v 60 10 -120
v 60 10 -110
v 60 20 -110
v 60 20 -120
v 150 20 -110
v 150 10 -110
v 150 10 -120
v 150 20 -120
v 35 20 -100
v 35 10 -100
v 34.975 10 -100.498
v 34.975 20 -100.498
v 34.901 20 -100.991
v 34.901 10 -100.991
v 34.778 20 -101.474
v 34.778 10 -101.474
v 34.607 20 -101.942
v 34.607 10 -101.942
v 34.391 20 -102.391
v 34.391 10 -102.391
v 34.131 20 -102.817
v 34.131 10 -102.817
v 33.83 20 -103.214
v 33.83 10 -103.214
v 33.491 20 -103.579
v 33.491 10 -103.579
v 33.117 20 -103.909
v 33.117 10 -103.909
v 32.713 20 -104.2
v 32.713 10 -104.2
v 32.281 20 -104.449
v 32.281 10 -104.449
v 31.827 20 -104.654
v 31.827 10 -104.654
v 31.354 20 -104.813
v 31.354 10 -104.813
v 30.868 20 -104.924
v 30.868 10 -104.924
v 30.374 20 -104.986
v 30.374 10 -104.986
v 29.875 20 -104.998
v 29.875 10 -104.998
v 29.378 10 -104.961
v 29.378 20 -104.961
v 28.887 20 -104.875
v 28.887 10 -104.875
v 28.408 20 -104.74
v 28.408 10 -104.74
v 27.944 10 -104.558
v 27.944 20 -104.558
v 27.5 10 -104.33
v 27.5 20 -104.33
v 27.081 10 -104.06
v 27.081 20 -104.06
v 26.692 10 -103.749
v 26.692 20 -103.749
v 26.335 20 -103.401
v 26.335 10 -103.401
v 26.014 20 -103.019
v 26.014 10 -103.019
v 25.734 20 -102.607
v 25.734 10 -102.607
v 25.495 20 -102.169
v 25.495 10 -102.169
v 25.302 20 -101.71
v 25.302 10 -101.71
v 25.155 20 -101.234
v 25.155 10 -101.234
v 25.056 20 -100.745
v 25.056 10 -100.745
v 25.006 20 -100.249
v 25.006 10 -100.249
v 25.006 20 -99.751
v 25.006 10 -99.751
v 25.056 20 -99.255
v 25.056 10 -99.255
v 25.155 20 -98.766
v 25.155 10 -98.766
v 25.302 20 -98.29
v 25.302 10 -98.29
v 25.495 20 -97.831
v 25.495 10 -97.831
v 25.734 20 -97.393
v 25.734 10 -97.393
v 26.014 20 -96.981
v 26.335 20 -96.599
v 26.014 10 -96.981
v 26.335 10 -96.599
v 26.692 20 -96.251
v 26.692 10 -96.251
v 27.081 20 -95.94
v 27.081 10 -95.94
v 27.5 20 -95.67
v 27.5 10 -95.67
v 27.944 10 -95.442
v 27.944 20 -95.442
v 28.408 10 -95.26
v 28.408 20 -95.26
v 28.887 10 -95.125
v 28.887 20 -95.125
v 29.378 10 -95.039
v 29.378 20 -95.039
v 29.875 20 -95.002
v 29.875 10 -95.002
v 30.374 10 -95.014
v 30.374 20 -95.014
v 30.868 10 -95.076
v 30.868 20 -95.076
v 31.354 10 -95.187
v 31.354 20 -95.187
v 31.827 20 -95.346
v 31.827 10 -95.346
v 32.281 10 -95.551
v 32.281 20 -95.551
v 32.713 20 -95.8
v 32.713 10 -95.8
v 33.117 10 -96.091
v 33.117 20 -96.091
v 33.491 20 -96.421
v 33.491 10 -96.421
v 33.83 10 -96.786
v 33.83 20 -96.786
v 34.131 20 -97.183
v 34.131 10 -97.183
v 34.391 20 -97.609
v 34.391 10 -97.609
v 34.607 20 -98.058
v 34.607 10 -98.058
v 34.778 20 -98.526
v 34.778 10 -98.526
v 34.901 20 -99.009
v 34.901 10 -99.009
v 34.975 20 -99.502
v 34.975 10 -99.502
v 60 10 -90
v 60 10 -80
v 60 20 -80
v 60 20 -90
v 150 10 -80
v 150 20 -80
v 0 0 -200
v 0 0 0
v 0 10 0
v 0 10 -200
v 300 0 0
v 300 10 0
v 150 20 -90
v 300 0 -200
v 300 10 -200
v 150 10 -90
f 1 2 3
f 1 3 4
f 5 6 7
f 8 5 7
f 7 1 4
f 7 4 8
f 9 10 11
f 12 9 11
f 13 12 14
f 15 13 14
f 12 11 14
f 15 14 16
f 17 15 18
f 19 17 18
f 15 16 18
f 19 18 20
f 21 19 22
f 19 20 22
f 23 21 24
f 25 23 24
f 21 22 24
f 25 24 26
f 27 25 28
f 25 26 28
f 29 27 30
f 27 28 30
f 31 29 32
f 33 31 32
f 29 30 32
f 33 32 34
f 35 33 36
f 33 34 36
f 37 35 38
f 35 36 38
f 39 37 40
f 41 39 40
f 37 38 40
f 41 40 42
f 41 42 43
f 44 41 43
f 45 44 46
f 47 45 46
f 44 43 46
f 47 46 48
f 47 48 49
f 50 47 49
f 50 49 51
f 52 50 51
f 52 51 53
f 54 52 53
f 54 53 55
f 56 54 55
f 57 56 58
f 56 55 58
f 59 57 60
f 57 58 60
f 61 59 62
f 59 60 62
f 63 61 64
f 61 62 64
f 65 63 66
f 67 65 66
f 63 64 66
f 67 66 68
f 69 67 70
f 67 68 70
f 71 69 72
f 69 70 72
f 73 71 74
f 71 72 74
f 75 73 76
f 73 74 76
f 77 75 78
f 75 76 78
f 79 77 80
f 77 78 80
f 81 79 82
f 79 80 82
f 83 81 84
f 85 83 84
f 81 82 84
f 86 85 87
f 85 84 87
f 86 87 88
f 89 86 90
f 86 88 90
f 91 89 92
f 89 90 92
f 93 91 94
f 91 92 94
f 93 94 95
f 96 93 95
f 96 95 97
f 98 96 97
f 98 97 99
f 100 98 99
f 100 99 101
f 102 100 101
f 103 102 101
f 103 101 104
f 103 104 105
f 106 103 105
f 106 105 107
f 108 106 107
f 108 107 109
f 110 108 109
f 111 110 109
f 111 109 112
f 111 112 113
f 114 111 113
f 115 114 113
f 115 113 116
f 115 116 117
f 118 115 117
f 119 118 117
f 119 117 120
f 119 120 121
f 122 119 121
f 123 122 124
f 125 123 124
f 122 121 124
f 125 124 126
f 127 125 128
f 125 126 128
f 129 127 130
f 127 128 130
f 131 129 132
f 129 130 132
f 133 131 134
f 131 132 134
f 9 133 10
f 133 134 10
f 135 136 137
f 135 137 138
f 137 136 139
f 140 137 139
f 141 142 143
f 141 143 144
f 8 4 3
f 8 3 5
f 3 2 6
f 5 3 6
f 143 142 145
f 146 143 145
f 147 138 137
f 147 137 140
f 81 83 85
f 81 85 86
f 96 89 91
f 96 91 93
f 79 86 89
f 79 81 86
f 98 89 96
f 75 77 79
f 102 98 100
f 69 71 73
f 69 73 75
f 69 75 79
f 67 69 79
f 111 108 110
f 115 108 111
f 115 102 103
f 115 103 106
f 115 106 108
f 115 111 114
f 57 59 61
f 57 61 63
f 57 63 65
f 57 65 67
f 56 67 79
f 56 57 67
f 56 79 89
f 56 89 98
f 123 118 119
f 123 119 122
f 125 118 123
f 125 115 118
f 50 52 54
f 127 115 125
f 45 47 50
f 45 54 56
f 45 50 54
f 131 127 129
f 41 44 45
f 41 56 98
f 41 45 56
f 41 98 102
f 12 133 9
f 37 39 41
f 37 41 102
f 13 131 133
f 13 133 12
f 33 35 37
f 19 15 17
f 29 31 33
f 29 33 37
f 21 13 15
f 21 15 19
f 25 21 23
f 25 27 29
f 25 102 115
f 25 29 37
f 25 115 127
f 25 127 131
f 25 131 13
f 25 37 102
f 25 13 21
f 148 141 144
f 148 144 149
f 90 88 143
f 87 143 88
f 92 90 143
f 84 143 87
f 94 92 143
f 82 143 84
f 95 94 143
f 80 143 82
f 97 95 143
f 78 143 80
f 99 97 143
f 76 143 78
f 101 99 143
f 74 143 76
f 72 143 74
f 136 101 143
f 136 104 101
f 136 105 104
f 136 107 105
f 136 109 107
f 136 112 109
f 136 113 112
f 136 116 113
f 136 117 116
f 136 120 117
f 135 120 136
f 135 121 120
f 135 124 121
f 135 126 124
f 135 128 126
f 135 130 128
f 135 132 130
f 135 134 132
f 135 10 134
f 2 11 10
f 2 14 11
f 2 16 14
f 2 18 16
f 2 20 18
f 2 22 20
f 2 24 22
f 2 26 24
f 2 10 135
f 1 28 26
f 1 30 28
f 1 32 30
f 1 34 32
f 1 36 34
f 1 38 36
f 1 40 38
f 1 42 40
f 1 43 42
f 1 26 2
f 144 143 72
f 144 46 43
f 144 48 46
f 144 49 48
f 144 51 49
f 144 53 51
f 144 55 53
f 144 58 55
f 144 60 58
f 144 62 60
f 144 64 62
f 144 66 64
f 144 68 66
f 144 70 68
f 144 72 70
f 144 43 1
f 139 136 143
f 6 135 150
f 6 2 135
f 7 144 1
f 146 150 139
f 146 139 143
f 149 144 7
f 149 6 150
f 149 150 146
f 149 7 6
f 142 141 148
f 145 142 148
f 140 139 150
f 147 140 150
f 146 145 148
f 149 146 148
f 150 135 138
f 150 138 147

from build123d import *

# Parameters (mm, degrees)
SKETCH1_W           = 300
SKETCH1_H           = 200
BOSS_EXTRUDE1_DEPTH = 10
SKETCH2_R           = 5
SKETCH2_W           = 90
SKETCH2_H           = 10
BOSS_EXTRUDE2_DEPTH = 10


with BuildPart() as part:
    # Sketch1 → Boss-Extrude1 (new body)
    with BuildSketch(Plane(origin=(0, 0, 0), x_dir=(1, 0, 0), z_dir=(0, 1, 0))):
        with Locations((150, 100)):
            Rectangle(SKETCH1_W, SKETCH1_H)
    extrude(amount=BOSS_EXTRUDE1_DEPTH)

    # Sketch2 → Boss-Extrude2 (add)
    with BuildSketch(Plane(origin=(0, 10, 0), x_dir=(1, 0, 0), z_dir=(0, 1, 0))):
        with Locations((30, 100)):
            Circle(SKETCH2_R)
        with Locations((105, 115)):
            Rectangle(SKETCH2_W, SKETCH2_H)
        with Locations((105, 85)):
            Rectangle(SKETCH2_W, SKETCH2_H)
    extrude(amount=BOSS_EXTRUDE2_DEPTH)


solid = part.part
